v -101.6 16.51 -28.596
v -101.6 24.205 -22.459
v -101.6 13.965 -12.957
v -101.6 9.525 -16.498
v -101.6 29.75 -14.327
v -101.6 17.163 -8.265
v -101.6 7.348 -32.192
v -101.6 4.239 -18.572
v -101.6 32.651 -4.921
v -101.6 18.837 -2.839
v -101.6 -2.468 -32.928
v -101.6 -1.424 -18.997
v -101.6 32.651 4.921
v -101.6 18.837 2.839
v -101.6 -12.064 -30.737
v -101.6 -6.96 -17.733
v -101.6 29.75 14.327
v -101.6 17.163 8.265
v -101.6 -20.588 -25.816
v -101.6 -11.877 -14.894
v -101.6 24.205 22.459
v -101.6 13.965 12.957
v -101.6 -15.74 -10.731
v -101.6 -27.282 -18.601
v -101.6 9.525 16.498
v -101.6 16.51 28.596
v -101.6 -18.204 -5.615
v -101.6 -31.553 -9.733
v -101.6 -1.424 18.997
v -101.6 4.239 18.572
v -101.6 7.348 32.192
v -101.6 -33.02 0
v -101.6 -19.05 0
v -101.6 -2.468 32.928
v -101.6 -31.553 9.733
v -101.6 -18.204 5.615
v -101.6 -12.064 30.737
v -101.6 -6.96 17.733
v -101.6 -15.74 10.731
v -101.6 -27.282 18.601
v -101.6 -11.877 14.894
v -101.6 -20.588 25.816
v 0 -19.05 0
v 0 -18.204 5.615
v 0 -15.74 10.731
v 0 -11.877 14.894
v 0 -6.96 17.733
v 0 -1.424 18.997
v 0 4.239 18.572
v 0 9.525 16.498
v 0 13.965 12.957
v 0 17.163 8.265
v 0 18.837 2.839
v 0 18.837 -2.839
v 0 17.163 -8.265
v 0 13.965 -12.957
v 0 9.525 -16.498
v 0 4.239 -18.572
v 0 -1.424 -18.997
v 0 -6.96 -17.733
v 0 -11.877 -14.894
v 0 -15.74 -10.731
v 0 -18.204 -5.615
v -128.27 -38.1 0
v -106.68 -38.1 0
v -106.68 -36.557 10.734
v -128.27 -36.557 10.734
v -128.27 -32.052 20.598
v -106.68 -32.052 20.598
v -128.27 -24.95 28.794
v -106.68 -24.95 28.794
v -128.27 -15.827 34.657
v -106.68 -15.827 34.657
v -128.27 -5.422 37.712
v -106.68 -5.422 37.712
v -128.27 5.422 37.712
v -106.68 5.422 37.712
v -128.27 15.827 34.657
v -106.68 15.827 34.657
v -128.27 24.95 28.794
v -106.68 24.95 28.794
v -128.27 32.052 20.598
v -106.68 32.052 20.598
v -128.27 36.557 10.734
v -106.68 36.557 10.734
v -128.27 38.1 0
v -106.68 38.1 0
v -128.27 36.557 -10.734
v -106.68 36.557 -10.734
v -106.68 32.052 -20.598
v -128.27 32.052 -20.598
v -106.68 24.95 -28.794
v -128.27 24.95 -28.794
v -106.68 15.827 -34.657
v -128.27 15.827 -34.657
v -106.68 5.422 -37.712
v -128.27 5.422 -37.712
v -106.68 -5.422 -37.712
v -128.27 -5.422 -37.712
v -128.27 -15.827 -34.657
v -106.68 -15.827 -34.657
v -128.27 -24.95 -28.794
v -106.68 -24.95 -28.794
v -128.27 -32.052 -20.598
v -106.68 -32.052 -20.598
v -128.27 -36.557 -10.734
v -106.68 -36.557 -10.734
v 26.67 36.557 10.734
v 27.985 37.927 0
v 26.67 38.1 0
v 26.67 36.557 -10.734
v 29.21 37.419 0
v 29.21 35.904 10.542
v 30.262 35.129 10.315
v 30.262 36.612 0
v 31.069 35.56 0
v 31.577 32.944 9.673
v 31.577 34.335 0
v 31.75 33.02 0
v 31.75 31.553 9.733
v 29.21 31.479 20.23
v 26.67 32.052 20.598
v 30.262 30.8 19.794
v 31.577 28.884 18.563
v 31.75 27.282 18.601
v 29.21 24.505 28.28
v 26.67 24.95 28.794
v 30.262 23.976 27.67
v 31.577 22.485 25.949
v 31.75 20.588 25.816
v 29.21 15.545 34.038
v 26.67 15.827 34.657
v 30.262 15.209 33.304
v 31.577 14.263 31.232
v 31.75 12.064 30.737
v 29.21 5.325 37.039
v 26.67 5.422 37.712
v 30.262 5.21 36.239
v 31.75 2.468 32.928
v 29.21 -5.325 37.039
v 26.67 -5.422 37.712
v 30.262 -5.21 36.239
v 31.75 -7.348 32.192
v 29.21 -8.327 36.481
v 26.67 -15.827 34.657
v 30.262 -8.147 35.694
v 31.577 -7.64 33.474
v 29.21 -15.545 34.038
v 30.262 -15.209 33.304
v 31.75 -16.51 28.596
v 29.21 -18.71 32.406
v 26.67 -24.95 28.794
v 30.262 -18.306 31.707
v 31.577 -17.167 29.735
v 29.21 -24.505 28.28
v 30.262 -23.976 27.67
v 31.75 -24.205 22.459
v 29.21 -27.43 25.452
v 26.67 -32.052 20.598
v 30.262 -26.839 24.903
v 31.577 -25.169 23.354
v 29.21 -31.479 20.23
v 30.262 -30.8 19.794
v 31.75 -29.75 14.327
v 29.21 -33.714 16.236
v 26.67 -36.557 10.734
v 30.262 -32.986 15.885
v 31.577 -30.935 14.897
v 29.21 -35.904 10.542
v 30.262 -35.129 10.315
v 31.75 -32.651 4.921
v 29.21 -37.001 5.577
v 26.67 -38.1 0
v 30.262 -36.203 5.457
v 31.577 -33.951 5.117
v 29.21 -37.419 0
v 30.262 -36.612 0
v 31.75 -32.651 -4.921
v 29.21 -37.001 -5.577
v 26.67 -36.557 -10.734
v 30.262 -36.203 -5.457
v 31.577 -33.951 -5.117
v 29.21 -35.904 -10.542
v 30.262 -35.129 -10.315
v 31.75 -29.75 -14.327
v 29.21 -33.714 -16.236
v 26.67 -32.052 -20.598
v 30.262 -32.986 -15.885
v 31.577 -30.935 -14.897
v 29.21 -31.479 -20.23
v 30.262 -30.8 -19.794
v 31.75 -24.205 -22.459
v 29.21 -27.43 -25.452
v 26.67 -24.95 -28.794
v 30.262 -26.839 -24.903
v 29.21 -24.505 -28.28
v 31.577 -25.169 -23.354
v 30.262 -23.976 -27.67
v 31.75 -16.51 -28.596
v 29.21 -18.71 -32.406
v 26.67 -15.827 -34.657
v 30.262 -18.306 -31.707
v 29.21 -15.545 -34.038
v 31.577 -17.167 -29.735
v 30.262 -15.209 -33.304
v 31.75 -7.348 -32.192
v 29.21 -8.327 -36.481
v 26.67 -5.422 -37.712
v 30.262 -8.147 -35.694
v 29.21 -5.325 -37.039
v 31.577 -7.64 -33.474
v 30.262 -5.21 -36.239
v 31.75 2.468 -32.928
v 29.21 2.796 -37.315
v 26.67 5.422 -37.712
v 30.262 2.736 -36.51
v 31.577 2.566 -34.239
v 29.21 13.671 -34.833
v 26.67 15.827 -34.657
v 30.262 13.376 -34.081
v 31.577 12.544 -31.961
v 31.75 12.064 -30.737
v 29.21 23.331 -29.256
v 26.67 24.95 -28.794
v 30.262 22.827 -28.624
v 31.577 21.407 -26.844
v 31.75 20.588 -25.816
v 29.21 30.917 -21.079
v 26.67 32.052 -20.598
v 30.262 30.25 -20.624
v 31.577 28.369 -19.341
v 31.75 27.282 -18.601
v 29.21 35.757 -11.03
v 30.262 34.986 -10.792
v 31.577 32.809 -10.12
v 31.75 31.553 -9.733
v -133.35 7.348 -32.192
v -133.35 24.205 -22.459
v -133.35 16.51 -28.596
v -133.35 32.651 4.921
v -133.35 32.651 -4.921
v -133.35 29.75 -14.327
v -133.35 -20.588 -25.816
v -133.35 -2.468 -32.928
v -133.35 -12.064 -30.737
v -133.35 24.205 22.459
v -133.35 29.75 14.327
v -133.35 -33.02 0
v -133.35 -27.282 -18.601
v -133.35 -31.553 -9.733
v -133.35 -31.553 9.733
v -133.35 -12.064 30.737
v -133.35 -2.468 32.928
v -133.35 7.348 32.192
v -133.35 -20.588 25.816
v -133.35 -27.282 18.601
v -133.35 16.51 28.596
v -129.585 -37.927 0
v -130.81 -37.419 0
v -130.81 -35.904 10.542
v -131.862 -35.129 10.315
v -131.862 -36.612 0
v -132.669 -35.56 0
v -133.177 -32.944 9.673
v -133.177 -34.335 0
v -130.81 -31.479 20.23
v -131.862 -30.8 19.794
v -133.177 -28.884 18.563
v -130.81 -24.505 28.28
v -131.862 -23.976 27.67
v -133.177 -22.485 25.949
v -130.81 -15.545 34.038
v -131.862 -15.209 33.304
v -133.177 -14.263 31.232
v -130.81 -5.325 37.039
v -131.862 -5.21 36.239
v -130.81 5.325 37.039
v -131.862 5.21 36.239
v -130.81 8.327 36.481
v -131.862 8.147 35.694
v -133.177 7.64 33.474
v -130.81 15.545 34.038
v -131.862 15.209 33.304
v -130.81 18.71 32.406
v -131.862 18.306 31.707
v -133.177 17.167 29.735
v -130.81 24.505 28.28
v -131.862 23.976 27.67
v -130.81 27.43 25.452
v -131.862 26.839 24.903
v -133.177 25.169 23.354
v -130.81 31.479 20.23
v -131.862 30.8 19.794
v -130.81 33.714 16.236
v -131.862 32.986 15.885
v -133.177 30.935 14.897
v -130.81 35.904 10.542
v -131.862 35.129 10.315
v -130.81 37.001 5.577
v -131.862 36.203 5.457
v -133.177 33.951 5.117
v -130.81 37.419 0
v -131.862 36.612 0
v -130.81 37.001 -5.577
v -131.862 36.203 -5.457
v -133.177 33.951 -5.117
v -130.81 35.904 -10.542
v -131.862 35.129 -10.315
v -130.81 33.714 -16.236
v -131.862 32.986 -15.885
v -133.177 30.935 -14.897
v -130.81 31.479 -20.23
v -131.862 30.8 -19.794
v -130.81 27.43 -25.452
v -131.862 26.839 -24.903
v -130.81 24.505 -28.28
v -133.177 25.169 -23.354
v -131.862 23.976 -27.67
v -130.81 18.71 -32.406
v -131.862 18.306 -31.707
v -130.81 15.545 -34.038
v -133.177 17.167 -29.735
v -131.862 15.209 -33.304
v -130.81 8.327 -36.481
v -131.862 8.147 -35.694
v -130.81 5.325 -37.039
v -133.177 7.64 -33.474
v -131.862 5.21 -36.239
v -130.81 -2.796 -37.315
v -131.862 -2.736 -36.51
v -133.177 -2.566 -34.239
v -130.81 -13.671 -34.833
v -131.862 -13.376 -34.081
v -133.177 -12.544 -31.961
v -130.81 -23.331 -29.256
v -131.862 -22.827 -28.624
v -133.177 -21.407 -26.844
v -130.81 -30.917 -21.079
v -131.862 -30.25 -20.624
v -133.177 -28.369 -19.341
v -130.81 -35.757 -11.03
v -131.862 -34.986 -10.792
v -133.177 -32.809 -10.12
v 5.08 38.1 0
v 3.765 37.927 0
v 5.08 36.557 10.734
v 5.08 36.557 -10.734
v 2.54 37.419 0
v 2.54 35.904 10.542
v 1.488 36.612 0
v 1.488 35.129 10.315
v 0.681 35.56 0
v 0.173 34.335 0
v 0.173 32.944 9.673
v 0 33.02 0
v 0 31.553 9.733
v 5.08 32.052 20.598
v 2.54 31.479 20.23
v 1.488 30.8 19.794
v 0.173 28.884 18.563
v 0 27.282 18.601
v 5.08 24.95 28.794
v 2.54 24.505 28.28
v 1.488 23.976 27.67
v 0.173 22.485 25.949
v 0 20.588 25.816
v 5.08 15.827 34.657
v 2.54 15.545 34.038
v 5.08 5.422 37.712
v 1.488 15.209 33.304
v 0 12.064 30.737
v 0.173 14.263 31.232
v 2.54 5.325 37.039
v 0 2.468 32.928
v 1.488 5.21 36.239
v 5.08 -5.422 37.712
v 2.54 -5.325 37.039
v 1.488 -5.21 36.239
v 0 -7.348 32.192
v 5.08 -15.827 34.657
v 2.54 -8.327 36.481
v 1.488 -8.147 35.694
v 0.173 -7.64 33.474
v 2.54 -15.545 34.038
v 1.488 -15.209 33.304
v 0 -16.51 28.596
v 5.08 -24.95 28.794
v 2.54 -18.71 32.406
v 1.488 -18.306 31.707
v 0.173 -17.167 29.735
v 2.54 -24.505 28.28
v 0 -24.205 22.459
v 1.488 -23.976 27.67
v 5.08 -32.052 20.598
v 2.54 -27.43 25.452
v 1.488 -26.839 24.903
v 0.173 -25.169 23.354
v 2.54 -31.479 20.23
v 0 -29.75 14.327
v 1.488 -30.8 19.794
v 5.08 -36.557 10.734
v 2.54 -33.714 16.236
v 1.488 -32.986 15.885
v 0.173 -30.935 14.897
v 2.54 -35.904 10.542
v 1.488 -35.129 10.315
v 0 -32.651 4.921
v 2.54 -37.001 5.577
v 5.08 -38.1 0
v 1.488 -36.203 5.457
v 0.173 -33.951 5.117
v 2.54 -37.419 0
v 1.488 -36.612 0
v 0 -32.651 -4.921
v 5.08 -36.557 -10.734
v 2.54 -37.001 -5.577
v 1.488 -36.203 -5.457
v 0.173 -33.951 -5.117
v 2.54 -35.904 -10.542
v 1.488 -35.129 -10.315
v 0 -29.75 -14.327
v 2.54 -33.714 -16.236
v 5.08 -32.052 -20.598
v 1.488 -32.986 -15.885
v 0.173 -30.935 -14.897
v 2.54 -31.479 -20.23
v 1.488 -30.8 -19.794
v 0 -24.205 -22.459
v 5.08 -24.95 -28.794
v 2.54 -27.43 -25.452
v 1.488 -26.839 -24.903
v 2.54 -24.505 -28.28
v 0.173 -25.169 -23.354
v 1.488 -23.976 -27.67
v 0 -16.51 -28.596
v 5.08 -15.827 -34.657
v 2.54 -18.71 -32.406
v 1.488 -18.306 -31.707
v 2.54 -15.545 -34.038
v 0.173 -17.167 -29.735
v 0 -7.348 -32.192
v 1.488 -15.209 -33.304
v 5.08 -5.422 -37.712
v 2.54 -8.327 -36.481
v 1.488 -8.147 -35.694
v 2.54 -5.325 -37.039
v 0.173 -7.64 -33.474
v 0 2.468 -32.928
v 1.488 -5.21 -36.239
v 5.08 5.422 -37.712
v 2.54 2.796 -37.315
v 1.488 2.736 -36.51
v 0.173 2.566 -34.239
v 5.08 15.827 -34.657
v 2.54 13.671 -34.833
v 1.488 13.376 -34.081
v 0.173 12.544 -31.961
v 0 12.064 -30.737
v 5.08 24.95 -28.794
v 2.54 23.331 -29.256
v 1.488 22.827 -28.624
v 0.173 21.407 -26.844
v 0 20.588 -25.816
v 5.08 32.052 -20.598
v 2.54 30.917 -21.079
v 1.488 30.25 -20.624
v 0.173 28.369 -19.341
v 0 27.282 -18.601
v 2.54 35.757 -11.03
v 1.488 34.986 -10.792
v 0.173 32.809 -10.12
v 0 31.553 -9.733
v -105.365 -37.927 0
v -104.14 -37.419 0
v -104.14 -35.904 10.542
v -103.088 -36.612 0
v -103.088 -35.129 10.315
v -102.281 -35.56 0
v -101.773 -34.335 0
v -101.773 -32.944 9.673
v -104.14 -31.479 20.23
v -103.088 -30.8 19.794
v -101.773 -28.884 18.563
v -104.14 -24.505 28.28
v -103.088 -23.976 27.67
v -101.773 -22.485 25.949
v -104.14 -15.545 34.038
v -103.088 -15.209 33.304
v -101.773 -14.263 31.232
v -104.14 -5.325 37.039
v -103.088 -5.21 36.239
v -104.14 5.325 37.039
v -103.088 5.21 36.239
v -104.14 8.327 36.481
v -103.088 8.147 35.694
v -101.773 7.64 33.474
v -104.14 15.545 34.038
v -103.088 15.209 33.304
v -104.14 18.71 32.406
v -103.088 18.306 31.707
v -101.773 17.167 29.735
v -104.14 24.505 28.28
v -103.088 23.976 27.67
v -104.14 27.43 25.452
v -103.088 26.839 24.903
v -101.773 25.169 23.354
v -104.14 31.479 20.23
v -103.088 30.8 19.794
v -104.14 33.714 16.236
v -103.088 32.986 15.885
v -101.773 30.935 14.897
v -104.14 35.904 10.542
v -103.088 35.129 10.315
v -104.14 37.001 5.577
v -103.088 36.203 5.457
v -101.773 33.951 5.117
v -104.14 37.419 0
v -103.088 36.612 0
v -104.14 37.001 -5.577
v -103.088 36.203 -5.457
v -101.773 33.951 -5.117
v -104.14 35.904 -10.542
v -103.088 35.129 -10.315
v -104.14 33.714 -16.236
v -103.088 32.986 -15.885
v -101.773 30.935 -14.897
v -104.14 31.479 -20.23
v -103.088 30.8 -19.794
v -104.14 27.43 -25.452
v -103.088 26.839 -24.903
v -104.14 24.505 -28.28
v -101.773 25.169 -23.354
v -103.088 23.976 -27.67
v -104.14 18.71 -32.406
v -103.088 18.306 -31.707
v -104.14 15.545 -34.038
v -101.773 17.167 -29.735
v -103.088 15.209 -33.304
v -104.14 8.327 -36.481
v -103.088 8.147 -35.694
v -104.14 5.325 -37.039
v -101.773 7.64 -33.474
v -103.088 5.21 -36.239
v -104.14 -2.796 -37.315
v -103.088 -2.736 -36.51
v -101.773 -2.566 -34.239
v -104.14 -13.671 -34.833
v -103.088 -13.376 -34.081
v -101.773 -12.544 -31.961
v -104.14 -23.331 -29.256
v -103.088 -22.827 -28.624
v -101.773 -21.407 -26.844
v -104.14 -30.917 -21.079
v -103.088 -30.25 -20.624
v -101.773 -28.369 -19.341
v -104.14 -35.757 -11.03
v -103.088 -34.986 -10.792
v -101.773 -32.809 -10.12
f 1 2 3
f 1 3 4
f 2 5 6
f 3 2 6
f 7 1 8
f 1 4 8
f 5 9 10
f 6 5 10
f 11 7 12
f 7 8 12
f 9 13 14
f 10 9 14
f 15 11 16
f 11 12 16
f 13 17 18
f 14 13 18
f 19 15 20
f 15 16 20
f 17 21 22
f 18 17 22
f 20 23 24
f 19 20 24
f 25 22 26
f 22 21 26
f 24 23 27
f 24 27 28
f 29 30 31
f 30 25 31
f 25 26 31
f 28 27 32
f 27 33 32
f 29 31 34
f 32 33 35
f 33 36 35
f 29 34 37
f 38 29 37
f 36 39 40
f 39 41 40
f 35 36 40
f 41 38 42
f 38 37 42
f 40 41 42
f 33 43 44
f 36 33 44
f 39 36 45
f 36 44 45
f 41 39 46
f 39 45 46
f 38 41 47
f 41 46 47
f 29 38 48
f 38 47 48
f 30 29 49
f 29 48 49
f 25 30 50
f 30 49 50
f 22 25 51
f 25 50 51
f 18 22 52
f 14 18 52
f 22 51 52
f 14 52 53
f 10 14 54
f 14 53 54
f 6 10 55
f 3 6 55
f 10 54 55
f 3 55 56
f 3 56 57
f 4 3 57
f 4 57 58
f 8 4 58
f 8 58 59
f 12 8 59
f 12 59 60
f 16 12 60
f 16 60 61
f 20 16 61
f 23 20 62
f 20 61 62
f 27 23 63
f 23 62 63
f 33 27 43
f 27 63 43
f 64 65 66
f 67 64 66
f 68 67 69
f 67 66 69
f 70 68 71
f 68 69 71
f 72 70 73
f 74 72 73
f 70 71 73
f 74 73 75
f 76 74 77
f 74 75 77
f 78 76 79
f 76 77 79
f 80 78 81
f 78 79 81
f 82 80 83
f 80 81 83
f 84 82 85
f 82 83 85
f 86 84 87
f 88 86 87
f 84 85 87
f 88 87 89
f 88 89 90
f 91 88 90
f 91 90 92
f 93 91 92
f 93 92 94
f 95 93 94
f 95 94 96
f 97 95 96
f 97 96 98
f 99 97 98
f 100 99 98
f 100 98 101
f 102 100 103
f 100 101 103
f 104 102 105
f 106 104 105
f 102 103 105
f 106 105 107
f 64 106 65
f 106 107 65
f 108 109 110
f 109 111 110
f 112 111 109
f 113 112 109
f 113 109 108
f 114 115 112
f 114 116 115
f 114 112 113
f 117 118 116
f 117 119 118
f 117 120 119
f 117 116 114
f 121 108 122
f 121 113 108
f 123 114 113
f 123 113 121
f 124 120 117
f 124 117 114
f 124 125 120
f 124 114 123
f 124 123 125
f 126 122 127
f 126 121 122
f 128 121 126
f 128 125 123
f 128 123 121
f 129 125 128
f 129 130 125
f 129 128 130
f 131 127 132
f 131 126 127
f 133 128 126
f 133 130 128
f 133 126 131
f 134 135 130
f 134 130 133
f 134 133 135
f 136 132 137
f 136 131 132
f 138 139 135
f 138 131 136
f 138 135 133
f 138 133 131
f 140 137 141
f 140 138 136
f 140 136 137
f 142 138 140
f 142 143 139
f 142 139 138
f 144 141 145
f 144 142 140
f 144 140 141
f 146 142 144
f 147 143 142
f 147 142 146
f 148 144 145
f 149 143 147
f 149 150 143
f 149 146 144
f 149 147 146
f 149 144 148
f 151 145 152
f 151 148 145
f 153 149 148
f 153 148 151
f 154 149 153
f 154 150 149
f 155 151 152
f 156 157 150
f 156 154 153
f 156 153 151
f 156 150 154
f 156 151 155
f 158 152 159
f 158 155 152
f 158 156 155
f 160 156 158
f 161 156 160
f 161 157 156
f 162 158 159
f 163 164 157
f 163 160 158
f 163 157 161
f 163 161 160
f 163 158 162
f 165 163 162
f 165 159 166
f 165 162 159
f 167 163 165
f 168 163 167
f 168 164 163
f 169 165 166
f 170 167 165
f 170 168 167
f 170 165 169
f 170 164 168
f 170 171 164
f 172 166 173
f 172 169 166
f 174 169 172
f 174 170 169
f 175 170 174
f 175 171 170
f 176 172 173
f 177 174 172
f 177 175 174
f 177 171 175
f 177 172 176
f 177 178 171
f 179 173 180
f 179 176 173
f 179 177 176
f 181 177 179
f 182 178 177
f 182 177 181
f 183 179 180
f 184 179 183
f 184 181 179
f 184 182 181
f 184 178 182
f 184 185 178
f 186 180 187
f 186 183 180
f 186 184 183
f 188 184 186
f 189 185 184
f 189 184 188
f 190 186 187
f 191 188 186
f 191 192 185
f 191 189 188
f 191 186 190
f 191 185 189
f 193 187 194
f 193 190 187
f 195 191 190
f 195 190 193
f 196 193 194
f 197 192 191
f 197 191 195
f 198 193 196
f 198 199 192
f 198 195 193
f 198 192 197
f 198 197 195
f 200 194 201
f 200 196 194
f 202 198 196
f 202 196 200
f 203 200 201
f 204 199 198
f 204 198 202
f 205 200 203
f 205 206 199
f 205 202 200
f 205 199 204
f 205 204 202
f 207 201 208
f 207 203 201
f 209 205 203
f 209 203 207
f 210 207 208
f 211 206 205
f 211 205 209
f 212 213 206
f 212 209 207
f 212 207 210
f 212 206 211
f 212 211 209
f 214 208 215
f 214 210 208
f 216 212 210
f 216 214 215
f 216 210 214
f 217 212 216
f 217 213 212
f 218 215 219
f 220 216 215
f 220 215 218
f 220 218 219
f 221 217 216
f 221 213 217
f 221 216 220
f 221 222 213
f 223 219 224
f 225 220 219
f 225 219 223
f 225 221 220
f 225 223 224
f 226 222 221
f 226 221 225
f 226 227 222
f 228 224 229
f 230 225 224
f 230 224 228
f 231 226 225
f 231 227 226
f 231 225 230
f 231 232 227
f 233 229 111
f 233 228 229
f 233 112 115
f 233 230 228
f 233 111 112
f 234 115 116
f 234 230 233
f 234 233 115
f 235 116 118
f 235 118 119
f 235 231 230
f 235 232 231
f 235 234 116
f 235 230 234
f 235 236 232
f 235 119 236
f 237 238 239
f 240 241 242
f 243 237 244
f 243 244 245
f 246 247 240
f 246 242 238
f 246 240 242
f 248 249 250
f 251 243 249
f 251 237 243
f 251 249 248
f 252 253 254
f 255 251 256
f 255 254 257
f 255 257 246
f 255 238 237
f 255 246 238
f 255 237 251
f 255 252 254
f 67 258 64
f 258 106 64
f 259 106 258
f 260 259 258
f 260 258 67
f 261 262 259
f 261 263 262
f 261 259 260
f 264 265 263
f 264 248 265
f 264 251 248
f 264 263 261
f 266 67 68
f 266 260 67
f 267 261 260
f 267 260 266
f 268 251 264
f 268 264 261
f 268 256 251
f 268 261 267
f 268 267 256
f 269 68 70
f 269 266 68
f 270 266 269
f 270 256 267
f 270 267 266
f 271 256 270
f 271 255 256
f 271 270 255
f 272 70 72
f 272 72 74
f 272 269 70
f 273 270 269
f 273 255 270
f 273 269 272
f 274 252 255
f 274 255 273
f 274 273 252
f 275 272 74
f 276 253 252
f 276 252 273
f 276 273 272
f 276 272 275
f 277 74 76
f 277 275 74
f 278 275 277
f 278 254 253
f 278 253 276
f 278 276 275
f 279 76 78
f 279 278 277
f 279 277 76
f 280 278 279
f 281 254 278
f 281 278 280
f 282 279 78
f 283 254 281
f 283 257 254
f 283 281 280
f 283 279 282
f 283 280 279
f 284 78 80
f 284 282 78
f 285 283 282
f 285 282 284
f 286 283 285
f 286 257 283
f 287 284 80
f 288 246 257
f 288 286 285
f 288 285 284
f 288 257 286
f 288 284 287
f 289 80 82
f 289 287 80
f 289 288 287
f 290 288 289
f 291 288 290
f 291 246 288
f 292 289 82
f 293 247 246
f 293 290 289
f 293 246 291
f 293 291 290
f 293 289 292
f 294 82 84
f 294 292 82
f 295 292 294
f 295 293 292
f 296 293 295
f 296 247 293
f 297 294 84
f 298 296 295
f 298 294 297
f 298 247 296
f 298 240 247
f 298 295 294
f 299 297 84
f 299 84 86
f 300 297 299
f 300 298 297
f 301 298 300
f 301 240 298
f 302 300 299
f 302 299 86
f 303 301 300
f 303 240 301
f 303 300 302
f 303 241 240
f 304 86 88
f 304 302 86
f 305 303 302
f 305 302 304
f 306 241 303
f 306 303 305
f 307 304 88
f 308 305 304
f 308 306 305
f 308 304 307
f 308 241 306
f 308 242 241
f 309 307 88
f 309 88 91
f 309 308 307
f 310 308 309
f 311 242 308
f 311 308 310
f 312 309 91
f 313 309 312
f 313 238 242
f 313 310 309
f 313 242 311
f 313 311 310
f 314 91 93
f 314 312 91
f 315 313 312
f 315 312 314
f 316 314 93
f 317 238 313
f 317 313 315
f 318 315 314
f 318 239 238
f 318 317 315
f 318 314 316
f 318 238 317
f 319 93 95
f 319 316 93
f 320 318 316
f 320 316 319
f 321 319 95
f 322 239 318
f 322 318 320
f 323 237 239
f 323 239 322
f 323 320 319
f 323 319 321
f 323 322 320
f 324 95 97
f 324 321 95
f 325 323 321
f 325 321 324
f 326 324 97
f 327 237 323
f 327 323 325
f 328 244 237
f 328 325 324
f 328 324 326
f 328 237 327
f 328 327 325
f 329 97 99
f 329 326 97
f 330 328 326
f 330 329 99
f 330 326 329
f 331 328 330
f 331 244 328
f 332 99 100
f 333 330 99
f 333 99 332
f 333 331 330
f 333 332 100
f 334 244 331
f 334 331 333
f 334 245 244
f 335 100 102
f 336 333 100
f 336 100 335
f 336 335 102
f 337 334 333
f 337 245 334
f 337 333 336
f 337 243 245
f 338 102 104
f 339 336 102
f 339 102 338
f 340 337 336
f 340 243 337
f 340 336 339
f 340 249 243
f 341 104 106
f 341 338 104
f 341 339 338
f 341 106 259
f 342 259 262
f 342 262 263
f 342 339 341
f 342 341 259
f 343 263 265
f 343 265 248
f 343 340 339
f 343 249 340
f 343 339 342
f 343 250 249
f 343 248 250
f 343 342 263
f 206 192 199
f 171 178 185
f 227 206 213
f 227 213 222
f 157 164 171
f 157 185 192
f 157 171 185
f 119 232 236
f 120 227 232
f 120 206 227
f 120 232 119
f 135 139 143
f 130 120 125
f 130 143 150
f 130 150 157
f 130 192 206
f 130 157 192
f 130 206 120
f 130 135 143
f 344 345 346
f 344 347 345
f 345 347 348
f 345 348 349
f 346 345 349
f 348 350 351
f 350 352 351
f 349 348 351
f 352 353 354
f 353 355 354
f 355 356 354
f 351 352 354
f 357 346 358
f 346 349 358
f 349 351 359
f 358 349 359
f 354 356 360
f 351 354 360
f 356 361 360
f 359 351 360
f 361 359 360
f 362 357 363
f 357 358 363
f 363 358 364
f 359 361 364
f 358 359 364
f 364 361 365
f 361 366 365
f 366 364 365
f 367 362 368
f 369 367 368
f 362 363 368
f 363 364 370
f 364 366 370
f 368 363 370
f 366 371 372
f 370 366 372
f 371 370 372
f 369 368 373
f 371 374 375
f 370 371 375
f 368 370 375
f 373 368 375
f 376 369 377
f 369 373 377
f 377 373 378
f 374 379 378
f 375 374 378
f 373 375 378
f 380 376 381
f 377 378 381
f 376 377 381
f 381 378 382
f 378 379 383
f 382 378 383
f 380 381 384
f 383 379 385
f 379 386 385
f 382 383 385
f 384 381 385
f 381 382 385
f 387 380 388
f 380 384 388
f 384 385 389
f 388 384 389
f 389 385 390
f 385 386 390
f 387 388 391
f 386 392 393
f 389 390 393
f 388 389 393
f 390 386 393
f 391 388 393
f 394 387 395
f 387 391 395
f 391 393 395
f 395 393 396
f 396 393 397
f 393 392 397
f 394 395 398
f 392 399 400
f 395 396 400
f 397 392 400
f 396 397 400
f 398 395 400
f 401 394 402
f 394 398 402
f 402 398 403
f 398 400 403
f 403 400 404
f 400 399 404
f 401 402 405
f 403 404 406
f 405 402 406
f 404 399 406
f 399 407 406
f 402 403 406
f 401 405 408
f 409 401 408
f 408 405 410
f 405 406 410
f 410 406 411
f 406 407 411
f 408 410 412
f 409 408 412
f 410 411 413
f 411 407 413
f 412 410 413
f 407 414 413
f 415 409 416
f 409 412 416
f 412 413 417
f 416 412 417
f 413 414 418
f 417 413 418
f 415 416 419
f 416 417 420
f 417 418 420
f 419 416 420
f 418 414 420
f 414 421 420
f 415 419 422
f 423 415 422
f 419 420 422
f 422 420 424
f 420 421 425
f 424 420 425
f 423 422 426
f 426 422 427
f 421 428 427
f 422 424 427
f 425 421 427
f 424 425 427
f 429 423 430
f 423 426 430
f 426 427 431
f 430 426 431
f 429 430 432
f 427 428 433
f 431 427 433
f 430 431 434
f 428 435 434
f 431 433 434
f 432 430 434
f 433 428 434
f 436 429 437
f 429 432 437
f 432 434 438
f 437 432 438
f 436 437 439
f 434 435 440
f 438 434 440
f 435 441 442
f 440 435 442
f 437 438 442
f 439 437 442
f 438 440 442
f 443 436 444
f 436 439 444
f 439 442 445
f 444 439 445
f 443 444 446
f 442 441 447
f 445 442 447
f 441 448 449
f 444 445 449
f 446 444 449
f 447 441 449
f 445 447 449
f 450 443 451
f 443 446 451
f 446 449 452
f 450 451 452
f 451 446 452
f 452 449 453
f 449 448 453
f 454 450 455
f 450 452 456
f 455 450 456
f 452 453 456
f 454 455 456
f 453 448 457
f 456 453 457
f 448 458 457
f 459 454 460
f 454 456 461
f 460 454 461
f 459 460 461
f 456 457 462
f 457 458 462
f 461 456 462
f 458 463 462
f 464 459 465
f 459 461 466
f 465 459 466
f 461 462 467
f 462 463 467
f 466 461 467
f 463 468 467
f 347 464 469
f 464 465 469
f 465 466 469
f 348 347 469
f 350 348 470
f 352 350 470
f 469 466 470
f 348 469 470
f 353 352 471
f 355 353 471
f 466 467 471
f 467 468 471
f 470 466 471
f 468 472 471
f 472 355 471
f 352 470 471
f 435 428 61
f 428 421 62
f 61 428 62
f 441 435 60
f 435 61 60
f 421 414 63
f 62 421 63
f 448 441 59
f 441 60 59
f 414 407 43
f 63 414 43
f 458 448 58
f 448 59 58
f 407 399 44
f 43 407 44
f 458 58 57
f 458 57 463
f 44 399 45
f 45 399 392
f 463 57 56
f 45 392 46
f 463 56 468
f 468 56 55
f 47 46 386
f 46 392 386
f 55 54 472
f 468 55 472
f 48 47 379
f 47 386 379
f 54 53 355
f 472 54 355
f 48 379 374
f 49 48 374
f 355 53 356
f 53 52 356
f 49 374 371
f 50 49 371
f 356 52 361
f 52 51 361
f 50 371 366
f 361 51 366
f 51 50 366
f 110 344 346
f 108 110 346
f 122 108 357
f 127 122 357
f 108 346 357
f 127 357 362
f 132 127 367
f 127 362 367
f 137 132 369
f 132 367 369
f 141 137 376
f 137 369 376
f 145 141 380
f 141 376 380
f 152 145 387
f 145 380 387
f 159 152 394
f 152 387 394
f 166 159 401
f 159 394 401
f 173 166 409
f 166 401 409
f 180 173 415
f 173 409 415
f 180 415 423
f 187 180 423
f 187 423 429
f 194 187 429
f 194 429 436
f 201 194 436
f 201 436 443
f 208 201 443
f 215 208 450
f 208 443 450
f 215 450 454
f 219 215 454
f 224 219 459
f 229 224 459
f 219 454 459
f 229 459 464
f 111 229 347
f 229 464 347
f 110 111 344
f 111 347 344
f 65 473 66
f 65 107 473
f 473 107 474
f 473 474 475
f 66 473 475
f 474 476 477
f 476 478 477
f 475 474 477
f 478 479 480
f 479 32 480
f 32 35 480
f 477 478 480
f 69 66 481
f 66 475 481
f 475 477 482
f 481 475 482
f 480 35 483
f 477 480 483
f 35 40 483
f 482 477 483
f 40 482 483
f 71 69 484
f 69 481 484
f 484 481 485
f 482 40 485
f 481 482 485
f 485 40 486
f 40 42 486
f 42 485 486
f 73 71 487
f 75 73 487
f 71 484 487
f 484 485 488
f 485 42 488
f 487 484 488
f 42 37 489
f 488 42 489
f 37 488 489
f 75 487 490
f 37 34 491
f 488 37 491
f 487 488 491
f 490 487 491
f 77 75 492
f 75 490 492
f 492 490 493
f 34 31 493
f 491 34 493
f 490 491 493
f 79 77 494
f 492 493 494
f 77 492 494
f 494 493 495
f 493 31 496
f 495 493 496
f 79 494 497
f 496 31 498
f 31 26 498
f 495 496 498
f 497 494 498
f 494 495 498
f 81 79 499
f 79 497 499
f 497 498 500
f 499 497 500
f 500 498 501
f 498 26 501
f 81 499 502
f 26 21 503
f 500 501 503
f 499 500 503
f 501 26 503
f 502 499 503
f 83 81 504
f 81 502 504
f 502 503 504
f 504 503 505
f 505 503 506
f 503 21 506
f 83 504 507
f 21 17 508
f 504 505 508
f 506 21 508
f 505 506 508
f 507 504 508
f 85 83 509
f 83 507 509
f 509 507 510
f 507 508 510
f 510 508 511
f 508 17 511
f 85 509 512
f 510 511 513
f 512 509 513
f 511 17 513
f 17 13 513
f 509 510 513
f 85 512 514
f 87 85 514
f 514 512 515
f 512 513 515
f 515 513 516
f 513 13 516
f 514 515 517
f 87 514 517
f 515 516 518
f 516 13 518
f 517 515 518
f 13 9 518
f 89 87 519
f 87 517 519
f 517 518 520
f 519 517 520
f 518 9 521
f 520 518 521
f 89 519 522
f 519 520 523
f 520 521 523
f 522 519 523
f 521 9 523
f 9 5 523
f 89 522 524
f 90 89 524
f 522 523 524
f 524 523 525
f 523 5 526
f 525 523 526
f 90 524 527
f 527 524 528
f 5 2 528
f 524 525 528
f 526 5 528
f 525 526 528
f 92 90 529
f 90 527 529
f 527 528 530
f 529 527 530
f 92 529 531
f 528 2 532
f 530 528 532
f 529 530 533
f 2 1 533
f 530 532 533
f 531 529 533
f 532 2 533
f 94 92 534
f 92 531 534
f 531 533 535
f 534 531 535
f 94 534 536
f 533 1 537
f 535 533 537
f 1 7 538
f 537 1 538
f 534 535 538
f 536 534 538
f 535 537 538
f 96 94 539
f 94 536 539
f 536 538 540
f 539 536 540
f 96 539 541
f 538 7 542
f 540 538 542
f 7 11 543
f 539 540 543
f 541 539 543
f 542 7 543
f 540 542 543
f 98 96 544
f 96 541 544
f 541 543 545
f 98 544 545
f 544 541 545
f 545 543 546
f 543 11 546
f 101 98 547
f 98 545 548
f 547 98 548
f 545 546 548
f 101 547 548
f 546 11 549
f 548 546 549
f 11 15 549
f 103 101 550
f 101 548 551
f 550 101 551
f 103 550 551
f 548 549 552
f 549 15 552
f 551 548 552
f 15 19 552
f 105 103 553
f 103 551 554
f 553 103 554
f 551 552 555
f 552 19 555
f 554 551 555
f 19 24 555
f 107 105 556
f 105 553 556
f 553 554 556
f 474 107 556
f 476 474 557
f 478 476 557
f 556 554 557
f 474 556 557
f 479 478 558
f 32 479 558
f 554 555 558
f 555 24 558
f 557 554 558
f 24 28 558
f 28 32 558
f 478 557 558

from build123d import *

# Parameters (mm, degrees)
F0_R     = 38.1
F1_DEPTH = 31.75
F2_R     = 5.08
F3_R     = 19.05
F4_DEPTH = 101.6
F5_R     = 38.1
F6_DEPTH = 31.75
F7_R     = 5.08


with BuildPart() as f1:
    # F0 (on Right) → F1 (new body)
    with BuildSketch(Plane.YZ):
        Circle(F0_R)
    extrude(amount=F1_DEPTH)

    # F2
    f2_edges = [f1.edges().sort_by_distance(p)[0] for p in [
        (0, -38.1, 0),
        (31.75, -38.1, 0),
    ]]
    fillet(f2_edges, radius=F2_R)

    # F3 (on face) → F4 (join)
    with BuildSketch(Plane(origin=(0, 0, 0), x_dir=(0, -1, 0), z_dir=(-1, 0, 0))):
        Circle(F3_R)
    extrude(amount=F4_DEPTH)

    # F5 (on face) → F6 (join)
    with BuildSketch(Plane(origin=(-101.6, 0, 0), x_dir=(0, -1, 0), z_dir=(-1, 0, 0))):
        Circle(F5_R)
    extrude(amount=F6_DEPTH)

    # F7
    f7_edges = [f1.edges().sort_by_distance(p)[0] for p in [
        (-101.6, 38.1, 0),
        (-133.35, 38.1, 0),
    ]]
    fillet(f7_edges, radius=F7_R)


solid = f1.part
